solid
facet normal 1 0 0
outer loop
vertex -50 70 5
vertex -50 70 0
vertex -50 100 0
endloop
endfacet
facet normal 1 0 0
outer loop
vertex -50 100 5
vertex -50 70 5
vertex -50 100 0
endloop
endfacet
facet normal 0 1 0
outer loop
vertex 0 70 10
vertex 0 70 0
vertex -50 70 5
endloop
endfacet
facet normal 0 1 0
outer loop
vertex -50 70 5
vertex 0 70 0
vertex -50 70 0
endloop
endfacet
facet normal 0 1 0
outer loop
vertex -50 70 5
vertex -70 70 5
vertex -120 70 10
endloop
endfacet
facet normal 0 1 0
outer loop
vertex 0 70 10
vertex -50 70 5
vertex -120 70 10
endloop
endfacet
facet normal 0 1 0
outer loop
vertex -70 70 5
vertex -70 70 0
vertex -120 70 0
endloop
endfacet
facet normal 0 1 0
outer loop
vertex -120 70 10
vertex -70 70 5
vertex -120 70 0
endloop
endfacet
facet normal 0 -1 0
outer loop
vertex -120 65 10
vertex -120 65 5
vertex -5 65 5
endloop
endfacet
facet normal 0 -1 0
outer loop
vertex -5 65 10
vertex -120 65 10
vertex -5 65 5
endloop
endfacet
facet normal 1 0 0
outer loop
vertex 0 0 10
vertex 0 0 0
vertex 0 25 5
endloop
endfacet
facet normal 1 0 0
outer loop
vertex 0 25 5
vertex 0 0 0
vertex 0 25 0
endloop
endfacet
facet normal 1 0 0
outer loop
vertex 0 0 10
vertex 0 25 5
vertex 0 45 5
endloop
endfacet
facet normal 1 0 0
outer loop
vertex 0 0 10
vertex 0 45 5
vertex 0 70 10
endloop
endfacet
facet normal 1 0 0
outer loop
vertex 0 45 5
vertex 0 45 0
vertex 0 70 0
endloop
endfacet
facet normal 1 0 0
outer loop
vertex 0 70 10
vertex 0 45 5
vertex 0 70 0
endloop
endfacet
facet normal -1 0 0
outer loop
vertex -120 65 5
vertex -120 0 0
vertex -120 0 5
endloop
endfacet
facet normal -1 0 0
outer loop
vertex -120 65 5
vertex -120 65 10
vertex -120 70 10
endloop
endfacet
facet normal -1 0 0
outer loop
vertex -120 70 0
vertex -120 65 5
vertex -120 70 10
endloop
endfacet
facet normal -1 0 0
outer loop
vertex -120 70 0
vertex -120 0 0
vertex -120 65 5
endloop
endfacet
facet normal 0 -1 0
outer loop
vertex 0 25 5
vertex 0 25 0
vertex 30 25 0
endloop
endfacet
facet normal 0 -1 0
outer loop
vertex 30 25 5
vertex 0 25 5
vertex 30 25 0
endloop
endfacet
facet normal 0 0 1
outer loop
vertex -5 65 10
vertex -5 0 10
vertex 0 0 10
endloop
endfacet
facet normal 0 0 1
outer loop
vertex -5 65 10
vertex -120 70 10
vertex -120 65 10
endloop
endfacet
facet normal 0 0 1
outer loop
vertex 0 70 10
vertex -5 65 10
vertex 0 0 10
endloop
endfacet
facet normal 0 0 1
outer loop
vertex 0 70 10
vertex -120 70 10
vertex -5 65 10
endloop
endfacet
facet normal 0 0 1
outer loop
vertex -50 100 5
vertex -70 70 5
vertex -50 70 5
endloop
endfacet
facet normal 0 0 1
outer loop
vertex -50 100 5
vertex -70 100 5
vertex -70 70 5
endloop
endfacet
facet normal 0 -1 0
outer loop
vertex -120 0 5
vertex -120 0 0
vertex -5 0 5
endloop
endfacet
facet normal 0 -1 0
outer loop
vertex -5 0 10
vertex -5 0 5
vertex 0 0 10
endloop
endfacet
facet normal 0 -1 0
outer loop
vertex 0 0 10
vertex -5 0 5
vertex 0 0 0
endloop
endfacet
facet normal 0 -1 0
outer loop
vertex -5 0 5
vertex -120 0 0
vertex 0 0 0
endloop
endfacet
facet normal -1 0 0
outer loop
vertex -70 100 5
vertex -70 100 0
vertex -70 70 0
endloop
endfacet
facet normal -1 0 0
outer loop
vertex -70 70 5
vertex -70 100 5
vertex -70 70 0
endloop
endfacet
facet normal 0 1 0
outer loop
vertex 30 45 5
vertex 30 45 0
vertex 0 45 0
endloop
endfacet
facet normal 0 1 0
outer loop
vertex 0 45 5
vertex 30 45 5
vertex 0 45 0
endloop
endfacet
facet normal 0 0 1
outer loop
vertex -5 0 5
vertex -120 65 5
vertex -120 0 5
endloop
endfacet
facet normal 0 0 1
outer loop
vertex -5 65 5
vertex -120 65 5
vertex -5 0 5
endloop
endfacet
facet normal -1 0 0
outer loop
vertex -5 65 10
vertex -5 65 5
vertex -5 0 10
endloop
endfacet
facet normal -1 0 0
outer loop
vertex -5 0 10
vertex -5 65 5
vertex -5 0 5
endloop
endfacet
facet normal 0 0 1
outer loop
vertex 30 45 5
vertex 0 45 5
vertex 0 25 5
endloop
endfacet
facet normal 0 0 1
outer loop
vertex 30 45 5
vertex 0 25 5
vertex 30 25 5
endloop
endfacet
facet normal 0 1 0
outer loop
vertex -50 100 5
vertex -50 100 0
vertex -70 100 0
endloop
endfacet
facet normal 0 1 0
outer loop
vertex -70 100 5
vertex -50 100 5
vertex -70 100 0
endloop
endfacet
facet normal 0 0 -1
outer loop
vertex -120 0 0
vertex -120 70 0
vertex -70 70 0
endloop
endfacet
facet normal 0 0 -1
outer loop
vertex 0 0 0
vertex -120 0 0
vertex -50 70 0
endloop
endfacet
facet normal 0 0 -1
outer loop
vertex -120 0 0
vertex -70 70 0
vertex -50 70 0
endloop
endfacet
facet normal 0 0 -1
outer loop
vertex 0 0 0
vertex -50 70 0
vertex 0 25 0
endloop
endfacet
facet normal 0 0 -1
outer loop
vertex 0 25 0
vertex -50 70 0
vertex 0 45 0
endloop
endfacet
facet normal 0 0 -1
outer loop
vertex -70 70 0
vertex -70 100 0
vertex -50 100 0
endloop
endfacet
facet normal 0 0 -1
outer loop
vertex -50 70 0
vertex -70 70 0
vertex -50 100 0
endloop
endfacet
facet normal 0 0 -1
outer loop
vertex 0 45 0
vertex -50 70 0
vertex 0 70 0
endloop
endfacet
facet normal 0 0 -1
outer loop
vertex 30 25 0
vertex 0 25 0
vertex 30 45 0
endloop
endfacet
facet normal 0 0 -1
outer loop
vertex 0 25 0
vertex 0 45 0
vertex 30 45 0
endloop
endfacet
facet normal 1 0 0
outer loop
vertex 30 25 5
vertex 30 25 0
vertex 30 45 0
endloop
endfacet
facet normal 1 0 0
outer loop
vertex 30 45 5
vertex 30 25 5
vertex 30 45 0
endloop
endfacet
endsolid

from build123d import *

# Parameters (mm, degrees)
F0_W     = 115
F0_H     = 65
F1_DEPTH = 5
F2_DEPTH = 5
F3_DEPTH = 10


with BuildPart() as f1:
    # F0 (on Top) → F1 (new body)
    with BuildSketch(Plane.XY):
        with Locations((-62.5, 32.5)):
            Rectangle(F0_W, F0_H)
    extrude(amount=F1_DEPTH)



with BuildPart() as f2:
    # F0 (on Top) → F2 (new body)
    with BuildSketch(Plane.XY):
        Polygon((-70, 70), (-50, 70), (-50, 100), (-60, 100), (-70, 100), align=None)
    extrude(amount=F2_DEPTH)


with BuildPart() as f2b:
    # F0 (on Top) → F2, piece 2 (new body)
    with BuildSketch(Plane.XY):
        Polygon((0, 45), (0, 25), (30, 25), (30, 35), (30, 45), align=None)
    extrude(amount=F2_DEPTH)


with BuildPart() as f1_1:
    add(f1.part)

    add(f2.part)  # F3 merges F2

    add(f2b.part)  # F3 merges F2b
    # F0 (on Top) → F3 (join)
    with BuildSketch(Plane.XY):
        Polygon((-5, 0), (0, 0), (0, 25), (0, 45), (0, 70), (-50, 70), (-70, 70), (-120, 70), (-120, 65), (-5, 65), align=None)
    extrude(amount=F3_DEPTH)


solid = f1_1.part
